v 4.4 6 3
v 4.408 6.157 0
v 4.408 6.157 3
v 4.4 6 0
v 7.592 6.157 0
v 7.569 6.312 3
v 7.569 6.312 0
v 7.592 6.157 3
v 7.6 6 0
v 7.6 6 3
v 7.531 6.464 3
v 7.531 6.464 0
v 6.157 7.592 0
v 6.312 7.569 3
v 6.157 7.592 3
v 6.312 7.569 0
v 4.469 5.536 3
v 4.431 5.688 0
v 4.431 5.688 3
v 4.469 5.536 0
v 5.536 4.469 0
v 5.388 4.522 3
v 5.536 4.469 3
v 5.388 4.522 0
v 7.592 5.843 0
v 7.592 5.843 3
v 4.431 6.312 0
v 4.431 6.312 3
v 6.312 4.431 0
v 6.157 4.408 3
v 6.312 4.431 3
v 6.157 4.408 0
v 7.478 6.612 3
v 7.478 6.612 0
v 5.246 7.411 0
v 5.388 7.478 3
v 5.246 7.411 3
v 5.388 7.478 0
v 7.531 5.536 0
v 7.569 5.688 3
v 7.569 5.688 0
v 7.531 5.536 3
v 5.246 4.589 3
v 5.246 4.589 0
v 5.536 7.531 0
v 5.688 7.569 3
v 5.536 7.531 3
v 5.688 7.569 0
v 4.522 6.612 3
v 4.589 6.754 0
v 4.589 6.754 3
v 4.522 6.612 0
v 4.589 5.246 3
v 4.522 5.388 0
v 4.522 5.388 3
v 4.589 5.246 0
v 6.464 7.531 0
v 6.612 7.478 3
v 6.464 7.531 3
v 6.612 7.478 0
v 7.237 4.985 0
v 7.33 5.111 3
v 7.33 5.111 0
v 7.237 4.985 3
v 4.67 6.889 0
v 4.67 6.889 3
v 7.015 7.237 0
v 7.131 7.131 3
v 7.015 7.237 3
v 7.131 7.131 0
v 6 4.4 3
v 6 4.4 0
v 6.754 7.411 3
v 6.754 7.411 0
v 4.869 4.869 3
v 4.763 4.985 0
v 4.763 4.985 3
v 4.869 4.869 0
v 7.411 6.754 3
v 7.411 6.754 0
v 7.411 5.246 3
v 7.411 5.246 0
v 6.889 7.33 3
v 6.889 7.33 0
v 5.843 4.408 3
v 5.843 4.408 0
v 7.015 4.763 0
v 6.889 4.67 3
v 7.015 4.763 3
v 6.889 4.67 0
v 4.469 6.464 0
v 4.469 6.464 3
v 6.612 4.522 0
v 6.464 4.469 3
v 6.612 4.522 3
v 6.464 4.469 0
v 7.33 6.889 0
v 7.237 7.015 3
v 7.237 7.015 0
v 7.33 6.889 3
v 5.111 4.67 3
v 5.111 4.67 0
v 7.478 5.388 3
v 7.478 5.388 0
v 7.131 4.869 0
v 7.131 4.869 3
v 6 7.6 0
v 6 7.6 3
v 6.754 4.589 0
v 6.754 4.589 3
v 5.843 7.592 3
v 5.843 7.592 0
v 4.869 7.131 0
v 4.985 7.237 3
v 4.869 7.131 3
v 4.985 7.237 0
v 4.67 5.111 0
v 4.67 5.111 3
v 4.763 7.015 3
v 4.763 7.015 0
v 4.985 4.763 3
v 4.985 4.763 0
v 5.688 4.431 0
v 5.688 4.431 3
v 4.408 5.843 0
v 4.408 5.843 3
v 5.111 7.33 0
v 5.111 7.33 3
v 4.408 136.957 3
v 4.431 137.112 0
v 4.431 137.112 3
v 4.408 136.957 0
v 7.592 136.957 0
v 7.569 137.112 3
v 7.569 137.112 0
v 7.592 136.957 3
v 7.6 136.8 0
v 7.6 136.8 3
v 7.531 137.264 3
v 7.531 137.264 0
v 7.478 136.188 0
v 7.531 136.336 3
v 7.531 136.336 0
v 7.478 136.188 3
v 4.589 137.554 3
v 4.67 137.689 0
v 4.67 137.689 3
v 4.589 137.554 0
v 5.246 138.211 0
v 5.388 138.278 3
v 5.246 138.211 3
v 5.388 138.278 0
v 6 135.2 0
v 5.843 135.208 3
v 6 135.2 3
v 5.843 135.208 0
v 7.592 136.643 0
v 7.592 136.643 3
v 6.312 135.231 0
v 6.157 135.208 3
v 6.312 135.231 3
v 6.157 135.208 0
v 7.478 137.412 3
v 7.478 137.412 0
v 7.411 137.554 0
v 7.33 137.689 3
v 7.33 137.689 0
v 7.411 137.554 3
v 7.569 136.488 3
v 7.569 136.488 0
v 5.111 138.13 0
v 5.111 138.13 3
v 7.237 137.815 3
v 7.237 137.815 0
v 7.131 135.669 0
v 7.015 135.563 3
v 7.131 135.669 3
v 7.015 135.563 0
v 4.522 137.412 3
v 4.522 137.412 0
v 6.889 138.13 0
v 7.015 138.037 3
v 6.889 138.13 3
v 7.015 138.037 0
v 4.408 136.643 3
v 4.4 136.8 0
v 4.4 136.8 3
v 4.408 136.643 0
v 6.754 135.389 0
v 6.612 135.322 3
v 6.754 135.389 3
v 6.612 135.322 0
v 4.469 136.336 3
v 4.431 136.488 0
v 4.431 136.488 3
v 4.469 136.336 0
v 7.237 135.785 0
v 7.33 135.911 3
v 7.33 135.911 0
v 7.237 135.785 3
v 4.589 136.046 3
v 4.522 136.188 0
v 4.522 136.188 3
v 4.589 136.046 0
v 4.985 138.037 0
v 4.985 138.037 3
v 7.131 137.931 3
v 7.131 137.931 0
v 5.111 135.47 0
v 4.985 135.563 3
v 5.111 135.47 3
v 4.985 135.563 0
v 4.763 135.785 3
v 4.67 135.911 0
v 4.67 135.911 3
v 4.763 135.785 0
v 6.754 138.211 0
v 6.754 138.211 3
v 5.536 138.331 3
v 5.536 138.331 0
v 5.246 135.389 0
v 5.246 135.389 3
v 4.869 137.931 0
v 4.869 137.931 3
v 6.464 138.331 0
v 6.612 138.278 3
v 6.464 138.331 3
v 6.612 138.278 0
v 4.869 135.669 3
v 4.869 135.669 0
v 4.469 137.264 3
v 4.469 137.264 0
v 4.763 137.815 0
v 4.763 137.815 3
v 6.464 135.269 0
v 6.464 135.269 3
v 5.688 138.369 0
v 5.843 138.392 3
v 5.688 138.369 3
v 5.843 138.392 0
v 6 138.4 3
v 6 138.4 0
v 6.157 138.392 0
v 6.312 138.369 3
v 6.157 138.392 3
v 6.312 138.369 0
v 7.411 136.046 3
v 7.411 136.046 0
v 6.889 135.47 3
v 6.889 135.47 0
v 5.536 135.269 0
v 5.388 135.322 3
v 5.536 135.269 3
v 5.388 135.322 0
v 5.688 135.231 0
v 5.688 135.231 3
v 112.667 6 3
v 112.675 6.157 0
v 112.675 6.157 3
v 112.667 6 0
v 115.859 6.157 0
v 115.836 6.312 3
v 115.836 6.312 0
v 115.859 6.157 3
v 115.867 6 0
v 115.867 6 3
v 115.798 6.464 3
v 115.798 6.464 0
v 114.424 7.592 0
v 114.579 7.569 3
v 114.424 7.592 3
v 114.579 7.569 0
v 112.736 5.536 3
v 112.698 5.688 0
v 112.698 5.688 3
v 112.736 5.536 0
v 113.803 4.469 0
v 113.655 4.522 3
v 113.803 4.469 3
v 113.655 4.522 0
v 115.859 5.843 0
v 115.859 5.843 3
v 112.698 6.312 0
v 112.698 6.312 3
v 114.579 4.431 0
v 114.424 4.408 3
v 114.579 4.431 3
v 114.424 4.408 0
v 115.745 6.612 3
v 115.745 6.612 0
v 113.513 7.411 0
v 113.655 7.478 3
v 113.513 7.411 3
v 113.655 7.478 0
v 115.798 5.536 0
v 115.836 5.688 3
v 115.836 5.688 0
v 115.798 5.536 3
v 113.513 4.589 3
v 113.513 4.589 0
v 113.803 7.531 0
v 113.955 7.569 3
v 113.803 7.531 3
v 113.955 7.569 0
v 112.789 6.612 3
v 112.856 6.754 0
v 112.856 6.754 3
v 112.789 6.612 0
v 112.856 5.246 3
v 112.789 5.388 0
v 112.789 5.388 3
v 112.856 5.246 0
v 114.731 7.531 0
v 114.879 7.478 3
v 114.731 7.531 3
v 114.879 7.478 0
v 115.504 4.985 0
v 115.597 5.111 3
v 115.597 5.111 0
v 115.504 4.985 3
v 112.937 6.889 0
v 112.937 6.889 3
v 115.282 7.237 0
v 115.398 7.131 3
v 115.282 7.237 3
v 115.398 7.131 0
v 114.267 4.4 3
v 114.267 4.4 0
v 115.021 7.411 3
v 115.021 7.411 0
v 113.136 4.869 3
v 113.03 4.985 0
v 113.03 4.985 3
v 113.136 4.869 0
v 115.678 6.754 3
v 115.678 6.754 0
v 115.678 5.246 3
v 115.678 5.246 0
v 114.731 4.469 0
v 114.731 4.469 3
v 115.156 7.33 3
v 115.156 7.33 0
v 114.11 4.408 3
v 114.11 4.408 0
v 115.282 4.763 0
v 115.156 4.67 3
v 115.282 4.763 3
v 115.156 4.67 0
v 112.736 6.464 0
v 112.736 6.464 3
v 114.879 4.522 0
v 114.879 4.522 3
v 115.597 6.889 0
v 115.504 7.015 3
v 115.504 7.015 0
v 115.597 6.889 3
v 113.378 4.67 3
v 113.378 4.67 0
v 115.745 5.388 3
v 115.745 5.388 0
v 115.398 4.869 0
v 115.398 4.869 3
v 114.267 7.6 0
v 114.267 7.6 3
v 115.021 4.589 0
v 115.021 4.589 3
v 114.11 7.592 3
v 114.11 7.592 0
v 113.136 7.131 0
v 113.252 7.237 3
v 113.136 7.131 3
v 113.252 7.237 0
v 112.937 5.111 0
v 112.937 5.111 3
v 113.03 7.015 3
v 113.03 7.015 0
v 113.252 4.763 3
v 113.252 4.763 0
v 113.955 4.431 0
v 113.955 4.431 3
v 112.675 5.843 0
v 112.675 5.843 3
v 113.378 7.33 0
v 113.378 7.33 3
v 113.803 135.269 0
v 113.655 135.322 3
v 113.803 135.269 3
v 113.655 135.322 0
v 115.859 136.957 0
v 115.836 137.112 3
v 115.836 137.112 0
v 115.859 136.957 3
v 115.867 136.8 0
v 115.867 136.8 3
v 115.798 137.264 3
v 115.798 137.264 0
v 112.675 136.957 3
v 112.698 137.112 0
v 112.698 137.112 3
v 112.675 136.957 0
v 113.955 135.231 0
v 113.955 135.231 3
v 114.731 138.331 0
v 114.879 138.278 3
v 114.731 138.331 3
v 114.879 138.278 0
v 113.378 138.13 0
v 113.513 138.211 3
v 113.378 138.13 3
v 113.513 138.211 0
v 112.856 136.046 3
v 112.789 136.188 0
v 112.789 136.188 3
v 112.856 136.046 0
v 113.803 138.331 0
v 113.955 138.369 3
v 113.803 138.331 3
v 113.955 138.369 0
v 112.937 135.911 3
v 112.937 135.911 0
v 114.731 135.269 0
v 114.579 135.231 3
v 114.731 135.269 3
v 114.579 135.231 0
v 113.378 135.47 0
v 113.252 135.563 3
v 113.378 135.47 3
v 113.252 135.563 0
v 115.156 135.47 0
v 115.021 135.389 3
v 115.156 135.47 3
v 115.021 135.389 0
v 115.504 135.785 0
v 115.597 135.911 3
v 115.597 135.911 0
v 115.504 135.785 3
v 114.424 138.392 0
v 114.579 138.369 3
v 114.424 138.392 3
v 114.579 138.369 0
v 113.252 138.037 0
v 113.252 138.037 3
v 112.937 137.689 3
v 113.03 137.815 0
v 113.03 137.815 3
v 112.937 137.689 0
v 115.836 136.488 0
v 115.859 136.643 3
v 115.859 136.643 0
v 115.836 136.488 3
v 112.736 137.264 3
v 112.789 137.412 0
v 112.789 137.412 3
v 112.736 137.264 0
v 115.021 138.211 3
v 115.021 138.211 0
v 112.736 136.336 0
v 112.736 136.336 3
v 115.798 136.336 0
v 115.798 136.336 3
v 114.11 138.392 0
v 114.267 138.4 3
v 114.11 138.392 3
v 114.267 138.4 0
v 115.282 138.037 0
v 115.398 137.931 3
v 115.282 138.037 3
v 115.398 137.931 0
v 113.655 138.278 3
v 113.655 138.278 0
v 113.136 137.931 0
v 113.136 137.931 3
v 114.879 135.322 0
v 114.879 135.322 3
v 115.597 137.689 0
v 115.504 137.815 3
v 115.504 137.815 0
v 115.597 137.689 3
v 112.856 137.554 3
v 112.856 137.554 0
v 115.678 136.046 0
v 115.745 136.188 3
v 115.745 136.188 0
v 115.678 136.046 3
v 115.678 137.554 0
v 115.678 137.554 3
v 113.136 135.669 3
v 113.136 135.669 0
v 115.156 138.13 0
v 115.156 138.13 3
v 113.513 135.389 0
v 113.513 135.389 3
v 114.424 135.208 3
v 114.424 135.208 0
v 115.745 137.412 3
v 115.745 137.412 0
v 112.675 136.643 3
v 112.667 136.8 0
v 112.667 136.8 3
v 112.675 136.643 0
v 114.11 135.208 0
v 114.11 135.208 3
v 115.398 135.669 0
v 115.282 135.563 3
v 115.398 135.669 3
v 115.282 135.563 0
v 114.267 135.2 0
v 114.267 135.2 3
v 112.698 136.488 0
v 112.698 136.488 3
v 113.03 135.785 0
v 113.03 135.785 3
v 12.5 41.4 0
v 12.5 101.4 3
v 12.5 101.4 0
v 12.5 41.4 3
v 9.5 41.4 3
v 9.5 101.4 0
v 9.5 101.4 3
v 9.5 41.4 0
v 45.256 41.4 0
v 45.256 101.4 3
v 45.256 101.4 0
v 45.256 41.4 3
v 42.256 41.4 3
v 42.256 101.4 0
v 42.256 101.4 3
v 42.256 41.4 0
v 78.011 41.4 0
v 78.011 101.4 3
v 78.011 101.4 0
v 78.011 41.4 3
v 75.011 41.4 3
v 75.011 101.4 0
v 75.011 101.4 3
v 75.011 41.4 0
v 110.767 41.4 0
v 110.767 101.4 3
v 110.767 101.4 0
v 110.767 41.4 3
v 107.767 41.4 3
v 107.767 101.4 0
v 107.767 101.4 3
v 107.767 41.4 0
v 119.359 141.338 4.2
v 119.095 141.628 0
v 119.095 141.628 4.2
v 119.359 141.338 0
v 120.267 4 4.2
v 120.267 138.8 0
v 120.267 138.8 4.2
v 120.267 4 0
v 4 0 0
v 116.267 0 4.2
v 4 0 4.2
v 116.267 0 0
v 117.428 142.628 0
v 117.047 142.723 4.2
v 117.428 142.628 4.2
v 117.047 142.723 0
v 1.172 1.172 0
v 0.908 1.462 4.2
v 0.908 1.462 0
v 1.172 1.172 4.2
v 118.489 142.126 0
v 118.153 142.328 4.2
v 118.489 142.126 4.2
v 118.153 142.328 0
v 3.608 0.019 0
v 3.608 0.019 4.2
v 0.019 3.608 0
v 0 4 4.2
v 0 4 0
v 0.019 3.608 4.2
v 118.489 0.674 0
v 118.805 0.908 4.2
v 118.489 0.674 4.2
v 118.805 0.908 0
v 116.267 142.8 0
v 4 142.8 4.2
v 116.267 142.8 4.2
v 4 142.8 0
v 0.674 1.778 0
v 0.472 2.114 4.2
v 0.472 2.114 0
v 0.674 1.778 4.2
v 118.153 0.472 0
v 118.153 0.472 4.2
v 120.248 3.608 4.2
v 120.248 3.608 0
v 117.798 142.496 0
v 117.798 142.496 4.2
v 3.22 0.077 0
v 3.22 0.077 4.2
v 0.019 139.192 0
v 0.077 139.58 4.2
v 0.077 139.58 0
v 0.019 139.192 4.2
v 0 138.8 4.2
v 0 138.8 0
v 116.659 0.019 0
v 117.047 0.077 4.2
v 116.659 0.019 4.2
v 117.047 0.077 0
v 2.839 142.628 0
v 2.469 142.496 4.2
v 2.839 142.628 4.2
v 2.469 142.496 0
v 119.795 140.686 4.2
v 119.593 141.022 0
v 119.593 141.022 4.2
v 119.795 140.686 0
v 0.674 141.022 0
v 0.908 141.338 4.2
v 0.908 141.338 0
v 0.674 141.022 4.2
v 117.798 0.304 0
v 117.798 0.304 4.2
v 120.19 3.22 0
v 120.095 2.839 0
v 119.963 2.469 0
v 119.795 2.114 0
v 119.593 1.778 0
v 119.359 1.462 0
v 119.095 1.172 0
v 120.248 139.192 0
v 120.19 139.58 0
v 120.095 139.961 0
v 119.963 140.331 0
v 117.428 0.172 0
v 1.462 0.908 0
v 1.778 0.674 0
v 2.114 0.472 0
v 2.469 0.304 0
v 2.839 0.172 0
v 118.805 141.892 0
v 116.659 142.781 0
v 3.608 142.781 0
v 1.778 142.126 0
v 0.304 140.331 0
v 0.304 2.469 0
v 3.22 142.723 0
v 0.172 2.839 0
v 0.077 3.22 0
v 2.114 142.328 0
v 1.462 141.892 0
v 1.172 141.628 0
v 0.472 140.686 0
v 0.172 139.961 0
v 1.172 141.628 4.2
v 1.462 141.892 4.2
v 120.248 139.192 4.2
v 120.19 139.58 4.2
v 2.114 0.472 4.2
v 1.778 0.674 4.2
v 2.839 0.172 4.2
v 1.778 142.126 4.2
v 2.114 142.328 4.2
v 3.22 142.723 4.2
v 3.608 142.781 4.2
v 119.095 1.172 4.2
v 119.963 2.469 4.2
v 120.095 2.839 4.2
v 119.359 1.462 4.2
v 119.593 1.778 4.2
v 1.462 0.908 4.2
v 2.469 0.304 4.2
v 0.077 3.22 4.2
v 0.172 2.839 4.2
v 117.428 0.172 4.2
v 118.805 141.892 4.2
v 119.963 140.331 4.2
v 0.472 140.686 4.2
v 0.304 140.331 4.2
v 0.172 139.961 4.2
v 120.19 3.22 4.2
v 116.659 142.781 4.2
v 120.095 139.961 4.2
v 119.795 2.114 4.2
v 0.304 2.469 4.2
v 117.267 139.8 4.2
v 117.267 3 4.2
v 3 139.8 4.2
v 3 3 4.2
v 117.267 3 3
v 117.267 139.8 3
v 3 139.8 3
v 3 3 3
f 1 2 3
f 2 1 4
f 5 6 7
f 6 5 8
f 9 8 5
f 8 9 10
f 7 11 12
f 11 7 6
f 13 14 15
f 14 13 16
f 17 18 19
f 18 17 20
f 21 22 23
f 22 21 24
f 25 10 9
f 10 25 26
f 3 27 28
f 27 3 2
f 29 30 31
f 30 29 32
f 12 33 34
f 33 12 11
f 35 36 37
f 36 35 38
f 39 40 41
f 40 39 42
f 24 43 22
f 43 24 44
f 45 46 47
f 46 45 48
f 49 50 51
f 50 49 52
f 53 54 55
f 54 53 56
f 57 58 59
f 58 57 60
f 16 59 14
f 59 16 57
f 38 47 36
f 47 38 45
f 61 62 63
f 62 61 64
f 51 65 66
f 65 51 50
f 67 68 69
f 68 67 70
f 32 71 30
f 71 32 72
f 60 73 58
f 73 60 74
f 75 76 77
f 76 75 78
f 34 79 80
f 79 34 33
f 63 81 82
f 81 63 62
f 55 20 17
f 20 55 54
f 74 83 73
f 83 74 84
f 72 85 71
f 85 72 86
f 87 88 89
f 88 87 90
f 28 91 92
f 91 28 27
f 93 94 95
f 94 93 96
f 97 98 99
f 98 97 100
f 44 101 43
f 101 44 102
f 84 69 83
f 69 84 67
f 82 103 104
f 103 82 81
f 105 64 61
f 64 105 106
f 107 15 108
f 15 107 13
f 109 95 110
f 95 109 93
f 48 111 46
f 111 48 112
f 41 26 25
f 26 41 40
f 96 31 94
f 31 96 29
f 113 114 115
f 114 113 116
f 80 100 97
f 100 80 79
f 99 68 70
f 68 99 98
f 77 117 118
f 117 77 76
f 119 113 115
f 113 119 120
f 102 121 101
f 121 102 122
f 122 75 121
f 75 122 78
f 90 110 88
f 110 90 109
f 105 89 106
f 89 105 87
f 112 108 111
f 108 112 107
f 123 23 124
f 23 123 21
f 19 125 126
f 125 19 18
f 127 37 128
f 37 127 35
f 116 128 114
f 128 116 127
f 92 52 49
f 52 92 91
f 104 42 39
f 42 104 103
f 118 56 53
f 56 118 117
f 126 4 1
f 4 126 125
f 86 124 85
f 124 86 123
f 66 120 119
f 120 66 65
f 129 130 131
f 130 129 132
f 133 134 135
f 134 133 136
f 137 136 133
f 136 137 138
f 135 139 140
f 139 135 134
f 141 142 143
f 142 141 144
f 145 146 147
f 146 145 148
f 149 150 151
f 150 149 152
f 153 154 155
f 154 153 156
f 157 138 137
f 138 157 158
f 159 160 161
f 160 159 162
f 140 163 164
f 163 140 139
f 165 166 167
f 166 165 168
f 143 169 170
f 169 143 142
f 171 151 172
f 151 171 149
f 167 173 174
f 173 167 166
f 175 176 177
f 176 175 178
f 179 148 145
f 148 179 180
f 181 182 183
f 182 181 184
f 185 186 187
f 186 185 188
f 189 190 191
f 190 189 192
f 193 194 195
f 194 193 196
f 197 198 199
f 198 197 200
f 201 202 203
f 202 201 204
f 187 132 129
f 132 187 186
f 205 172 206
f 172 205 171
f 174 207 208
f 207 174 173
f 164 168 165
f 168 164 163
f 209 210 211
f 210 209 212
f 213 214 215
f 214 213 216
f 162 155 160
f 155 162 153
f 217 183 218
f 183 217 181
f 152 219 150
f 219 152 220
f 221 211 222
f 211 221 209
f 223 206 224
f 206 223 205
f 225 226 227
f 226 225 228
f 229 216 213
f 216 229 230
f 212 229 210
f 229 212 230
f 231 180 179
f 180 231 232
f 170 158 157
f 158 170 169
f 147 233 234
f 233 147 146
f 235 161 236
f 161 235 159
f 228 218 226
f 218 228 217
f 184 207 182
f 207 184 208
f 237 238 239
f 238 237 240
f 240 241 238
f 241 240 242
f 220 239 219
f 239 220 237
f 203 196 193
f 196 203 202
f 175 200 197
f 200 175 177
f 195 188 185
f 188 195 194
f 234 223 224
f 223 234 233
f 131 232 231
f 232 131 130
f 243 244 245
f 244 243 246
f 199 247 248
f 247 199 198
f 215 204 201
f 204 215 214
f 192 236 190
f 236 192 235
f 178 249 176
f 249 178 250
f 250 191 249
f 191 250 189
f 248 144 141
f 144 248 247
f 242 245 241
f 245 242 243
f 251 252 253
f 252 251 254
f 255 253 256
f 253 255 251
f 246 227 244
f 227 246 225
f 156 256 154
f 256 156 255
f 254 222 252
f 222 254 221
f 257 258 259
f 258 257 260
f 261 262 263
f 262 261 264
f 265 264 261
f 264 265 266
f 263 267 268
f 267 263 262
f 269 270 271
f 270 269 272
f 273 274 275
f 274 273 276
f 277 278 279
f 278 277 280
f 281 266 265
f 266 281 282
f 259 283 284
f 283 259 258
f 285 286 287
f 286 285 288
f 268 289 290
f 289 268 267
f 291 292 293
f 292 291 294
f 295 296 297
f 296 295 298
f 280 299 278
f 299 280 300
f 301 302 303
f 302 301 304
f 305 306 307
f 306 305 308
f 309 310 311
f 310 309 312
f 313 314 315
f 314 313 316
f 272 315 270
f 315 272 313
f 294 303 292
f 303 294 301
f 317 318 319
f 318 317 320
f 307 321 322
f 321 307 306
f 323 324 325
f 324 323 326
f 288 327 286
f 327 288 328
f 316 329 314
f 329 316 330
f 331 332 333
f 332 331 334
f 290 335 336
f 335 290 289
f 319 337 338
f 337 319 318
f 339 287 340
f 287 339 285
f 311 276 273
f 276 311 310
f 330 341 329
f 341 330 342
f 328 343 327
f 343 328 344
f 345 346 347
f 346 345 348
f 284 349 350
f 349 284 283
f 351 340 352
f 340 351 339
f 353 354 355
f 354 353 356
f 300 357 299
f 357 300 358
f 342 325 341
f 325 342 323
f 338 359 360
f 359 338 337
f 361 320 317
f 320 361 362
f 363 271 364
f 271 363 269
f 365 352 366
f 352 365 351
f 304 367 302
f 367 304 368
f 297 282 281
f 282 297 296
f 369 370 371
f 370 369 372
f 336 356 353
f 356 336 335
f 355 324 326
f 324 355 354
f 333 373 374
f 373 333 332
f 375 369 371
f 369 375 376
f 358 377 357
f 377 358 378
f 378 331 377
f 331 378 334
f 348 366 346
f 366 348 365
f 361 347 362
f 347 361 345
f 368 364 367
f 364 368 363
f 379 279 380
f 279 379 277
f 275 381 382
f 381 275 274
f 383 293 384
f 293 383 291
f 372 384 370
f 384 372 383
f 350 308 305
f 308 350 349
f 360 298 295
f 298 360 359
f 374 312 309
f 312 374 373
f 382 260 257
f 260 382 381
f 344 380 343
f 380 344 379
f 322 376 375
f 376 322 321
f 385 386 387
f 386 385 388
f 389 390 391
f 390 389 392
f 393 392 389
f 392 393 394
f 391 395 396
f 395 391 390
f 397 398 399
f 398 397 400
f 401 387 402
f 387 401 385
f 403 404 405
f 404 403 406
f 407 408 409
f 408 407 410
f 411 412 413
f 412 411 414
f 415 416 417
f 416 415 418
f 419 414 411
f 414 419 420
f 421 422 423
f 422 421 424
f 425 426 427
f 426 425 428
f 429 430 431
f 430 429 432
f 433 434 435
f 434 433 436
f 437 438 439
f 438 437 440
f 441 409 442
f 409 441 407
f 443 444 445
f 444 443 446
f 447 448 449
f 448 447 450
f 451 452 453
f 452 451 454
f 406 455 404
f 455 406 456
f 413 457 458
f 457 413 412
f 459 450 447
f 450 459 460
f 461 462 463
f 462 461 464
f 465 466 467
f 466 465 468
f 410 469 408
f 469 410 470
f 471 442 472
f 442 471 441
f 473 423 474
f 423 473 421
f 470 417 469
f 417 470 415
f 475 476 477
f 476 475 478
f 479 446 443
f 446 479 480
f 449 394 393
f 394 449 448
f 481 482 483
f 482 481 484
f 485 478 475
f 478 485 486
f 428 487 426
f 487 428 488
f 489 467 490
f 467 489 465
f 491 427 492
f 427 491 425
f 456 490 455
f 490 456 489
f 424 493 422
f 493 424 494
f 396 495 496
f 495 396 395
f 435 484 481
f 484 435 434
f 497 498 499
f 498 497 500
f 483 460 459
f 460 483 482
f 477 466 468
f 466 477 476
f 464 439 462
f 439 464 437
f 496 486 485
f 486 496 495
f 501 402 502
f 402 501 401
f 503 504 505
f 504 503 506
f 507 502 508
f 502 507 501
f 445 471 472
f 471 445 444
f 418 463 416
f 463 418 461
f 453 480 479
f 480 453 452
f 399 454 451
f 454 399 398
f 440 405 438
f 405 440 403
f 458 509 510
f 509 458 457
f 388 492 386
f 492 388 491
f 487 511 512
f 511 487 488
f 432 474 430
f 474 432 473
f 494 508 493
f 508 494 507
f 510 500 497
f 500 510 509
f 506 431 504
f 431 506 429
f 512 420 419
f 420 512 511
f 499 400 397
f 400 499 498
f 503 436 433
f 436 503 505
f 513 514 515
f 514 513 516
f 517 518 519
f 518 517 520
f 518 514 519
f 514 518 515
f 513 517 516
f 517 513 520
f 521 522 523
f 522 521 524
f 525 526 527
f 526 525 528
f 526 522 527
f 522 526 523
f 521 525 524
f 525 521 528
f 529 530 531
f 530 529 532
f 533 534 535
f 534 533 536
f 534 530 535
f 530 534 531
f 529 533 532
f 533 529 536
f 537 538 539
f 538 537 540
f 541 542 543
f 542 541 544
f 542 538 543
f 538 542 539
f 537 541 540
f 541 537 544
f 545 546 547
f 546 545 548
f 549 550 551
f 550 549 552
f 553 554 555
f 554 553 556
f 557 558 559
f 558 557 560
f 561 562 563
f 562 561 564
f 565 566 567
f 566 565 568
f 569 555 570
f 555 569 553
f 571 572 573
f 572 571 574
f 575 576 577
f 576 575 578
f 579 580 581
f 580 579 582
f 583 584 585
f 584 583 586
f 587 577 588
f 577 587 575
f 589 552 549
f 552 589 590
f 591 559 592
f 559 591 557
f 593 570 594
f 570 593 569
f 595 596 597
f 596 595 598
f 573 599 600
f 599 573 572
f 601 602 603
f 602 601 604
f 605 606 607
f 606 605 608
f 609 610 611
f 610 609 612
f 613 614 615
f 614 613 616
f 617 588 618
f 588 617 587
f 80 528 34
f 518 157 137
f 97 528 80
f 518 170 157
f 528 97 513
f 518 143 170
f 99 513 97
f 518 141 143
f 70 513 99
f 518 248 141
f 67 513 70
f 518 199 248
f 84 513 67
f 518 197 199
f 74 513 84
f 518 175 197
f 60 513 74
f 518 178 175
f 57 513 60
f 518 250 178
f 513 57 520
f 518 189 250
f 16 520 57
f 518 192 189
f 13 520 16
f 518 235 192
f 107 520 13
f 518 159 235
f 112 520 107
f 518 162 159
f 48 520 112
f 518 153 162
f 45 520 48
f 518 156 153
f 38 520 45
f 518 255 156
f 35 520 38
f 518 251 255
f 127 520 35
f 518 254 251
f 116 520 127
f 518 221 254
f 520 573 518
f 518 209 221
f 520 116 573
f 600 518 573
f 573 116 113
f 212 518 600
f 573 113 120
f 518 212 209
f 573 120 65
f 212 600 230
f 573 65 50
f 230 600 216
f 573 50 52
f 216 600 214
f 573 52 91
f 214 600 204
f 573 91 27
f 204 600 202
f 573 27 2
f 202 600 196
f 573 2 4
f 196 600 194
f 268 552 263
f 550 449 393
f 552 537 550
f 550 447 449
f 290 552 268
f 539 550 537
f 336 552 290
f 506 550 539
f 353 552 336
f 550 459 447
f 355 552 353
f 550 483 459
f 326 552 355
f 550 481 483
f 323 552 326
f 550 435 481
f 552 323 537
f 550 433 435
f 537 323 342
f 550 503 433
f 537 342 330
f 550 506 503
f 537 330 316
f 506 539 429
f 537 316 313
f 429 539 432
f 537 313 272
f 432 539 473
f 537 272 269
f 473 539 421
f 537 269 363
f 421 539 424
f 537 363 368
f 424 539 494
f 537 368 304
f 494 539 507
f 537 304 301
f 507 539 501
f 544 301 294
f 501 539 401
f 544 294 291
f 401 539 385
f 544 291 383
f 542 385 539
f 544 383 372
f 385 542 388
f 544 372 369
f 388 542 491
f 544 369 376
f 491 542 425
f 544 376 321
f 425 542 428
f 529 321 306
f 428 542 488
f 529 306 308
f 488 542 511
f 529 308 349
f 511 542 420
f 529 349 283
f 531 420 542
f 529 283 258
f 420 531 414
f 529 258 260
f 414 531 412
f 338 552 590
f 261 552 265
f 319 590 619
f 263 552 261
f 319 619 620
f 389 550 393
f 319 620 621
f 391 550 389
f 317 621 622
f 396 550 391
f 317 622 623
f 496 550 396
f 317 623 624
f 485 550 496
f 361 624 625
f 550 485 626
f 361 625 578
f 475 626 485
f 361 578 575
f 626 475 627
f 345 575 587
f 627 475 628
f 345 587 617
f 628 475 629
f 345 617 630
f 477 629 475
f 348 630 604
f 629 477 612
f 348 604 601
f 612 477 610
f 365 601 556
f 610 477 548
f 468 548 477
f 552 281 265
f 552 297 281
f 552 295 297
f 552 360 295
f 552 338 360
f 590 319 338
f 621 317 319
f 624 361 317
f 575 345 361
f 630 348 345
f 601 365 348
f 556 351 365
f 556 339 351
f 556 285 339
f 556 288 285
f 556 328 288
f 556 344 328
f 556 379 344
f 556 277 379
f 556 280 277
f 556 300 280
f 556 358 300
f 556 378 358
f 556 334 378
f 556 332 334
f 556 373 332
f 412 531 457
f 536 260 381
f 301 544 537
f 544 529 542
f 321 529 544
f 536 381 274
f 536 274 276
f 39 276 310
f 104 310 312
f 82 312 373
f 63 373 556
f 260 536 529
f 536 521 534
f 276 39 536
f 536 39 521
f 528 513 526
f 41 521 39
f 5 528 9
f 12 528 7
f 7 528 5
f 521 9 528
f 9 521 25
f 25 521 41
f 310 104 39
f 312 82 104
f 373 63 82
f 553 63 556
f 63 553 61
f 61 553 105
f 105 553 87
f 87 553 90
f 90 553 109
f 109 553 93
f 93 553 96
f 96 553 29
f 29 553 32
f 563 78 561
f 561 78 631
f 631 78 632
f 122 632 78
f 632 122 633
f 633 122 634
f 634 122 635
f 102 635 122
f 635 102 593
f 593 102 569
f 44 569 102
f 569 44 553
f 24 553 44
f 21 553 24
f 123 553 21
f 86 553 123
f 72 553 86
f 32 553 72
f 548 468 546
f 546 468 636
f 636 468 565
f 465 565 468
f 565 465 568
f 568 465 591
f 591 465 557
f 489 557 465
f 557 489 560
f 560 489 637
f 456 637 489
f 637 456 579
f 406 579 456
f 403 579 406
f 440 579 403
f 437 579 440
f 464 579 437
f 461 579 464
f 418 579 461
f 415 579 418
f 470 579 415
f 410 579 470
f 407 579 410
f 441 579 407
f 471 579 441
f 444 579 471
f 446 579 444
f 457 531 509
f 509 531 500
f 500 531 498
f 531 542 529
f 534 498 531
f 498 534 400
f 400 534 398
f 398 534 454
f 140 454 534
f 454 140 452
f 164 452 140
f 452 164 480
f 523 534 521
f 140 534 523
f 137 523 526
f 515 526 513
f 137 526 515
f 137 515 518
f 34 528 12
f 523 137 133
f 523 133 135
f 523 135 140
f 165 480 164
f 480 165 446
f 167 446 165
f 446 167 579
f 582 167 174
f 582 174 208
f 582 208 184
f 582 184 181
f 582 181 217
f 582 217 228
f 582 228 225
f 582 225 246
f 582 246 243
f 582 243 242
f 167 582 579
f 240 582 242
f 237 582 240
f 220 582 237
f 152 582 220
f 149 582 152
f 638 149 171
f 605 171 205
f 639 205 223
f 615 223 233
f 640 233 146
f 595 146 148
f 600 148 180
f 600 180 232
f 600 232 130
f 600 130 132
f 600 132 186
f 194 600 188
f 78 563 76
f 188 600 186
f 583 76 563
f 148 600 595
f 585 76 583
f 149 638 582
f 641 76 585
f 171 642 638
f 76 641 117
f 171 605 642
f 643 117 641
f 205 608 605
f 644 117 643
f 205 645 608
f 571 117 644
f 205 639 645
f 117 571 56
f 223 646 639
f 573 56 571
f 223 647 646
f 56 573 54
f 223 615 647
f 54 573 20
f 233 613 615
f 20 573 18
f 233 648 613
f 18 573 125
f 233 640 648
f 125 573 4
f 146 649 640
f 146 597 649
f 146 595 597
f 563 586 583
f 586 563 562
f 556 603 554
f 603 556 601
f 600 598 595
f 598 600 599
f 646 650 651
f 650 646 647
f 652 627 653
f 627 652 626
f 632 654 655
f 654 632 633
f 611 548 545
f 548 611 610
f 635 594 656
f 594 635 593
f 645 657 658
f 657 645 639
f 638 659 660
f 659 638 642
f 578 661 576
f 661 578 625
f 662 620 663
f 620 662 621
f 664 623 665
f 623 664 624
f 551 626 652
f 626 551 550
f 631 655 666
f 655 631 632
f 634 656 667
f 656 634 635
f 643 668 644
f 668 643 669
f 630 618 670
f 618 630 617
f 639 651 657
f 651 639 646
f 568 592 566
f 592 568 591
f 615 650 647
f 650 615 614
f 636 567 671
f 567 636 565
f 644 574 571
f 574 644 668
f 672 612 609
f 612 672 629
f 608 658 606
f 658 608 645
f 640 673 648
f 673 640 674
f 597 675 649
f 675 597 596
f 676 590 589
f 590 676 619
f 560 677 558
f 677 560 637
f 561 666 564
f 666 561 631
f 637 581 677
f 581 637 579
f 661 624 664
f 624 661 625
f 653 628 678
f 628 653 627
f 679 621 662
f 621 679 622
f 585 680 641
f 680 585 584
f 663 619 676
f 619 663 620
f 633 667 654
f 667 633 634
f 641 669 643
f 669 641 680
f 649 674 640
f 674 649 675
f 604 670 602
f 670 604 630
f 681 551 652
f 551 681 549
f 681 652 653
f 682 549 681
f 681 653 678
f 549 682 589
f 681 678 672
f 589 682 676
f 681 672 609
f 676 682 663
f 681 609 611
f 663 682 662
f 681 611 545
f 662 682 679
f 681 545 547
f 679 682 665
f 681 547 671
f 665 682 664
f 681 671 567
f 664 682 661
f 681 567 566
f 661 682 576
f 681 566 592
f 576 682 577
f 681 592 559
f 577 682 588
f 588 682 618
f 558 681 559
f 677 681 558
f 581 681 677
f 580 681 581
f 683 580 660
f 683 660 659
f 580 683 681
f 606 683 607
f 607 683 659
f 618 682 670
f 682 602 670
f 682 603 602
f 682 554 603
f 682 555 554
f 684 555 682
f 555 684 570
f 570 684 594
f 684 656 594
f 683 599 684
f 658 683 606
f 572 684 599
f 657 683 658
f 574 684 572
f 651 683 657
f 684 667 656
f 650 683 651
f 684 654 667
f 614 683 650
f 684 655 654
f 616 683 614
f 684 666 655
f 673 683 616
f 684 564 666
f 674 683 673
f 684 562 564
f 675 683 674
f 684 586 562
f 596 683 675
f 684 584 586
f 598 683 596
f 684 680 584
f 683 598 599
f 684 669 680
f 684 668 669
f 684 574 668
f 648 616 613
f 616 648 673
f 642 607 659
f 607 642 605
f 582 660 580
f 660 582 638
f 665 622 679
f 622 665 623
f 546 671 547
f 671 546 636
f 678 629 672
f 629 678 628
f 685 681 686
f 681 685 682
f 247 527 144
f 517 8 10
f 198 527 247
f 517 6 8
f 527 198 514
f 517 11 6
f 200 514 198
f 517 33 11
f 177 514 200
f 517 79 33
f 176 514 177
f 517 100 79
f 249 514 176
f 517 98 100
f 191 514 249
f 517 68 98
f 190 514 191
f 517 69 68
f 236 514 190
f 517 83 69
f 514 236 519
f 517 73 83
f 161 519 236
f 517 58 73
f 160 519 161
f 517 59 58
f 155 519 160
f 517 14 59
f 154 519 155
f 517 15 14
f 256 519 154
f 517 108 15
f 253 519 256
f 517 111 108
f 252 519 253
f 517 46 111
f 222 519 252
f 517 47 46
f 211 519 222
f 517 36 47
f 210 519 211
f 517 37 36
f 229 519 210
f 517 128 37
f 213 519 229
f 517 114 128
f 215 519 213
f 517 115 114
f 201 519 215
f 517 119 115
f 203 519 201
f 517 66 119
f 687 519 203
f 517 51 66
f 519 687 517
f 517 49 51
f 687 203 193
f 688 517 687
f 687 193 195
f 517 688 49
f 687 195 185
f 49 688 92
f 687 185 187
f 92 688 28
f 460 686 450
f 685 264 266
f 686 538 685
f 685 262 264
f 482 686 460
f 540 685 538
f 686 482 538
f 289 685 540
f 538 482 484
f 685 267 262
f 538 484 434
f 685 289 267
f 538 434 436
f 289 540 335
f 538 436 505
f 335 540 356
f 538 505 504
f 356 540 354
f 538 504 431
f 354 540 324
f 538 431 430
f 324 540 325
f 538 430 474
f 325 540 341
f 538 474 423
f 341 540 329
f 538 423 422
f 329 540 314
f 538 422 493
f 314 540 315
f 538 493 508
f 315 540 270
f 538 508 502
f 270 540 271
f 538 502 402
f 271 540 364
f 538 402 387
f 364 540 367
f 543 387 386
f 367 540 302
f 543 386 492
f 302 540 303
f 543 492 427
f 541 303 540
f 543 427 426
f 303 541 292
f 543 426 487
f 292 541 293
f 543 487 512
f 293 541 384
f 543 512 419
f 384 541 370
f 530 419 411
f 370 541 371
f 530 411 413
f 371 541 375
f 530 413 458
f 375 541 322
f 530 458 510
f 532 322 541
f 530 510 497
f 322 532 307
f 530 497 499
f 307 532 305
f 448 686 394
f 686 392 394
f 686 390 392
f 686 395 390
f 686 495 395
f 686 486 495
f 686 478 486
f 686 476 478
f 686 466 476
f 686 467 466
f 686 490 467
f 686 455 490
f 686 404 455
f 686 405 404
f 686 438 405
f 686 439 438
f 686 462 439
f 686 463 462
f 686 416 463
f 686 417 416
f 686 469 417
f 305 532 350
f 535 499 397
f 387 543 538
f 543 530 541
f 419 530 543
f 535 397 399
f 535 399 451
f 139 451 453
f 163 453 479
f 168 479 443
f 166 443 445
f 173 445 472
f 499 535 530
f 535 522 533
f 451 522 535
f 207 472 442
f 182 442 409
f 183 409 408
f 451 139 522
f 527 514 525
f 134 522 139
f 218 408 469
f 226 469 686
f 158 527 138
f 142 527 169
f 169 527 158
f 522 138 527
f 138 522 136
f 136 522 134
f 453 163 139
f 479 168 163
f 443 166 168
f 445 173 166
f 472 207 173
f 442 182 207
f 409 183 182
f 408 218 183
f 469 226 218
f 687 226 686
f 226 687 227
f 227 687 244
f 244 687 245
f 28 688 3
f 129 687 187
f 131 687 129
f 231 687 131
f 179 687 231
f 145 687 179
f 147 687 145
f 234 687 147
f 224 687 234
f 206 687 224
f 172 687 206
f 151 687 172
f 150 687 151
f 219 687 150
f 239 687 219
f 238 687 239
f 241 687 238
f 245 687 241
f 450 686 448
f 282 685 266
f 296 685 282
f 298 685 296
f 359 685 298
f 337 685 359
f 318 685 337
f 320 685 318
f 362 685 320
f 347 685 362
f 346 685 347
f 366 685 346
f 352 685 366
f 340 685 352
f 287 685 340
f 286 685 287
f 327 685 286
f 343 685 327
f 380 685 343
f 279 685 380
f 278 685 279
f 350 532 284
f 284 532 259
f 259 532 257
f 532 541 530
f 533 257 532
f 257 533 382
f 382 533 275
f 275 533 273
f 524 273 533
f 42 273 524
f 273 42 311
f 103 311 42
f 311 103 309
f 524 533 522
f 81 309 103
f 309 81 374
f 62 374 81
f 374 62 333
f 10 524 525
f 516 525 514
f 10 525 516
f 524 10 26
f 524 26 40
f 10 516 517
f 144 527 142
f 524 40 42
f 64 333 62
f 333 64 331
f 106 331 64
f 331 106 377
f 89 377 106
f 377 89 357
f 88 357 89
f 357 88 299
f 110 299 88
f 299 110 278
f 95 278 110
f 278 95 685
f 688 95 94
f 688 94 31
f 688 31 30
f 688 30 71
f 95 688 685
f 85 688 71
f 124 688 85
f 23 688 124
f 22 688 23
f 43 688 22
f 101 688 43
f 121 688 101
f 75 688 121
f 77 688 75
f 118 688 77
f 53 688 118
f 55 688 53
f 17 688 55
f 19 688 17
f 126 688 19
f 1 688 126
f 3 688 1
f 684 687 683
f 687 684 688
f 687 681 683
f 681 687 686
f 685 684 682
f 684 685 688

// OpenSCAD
// MD-88 Breakout — Enclosure Base Plate
// Minimal base: flat plate sized to PCB + clearance, with a shallow
// pocket the PCB drops into. Side walls and lid are designed separately.
//
// Print: 0.2mm layers, 3+ walls, 20% infill. PETG or ABS preferred for
// cockpit thermal range; PLA only if cabin stays cool.

// === DIMENSIONS ===
PCB_W       = 113.467;   // PCB width  (X)
PCB_D       = 136.0;     // PCB depth  (Y)
PCB_T       = 1.6;       // PCB thickness

POCKET_GAP  = 0.4;       // clearance around PCB inside the pocket
POCKET_DEPTH= 1.2;       // how deep the PCB sits into the base (< PCB_T so it sticks up)

WALL        = 3.0;       // outer wall thickness around pocket
BASE_T      = 3.0;       // floor thickness below the pocket

CORNER_R    = 4.0;       // outer corner radius (cosmetic)

// Mounting screws for the side walls/lid you'll design — through the
// outer rim of the base. M3 clearance.
SCREW_HOLE_D = 3.2;
SCREW_INSET  = 6.0;      // distance from outer edge to screw center

// Optional cable relief slots in the floor for under-PCB wiring runs.
// Set FLOOR_VENTS = true to add them; false for a sealed floor.
FLOOR_VENTS  = true;

$fn = 64;

// === DERIVED ===
POCKET_W = PCB_W + 2*POCKET_GAP;
POCKET_D = PCB_D + 2*POCKET_GAP;
OUTER_W  = POCKET_W + 2*WALL;
OUTER_D  = POCKET_D + 2*WALL;
TOTAL_H  = BASE_T + POCKET_DEPTH;

// === BUILD ===
difference() {
    // Outer body
    rounded_box(OUTER_W, OUTER_D, TOTAL_H, CORNER_R);

    // PCB pocket (recess from the top)
    translate([WALL, WALL, BASE_T])
        cube([POCKET_W, POCKET_D, POCKET_DEPTH + 0.1]);

    // 4 corner M3 clearance holes for side walls / lid screws
    for (x = [SCREW_INSET, OUTER_W - SCREW_INSET])
        for (y = [SCREW_INSET, OUTER_D - SCREW_INSET])
            translate([x, y, -0.1])
                cylinder(d = SCREW_HOLE_D, h = TOTAL_H + 0.2);

    // Optional floor vent slots — 4 narrow slots inside the pocket
    if (FLOOR_VENTS) {
        for (i = [0:3]) {
            translate([WALL + 8 + i*((POCKET_W - 16) / 3) - 1.5,
                       WALL + POCKET_D/2 - 30,
                       -0.1])
                cube([3, 60, BASE_T + 0.2]);
        }
    }
}

// === MODULES ===
module rounded_box(w, d, h, r) {
    hull() {
        for (x = [r, w - r])
            for (y = [r, d - r])
                translate([x, y, 0])
                    cylinder(r = r, h = h);
    }
}
